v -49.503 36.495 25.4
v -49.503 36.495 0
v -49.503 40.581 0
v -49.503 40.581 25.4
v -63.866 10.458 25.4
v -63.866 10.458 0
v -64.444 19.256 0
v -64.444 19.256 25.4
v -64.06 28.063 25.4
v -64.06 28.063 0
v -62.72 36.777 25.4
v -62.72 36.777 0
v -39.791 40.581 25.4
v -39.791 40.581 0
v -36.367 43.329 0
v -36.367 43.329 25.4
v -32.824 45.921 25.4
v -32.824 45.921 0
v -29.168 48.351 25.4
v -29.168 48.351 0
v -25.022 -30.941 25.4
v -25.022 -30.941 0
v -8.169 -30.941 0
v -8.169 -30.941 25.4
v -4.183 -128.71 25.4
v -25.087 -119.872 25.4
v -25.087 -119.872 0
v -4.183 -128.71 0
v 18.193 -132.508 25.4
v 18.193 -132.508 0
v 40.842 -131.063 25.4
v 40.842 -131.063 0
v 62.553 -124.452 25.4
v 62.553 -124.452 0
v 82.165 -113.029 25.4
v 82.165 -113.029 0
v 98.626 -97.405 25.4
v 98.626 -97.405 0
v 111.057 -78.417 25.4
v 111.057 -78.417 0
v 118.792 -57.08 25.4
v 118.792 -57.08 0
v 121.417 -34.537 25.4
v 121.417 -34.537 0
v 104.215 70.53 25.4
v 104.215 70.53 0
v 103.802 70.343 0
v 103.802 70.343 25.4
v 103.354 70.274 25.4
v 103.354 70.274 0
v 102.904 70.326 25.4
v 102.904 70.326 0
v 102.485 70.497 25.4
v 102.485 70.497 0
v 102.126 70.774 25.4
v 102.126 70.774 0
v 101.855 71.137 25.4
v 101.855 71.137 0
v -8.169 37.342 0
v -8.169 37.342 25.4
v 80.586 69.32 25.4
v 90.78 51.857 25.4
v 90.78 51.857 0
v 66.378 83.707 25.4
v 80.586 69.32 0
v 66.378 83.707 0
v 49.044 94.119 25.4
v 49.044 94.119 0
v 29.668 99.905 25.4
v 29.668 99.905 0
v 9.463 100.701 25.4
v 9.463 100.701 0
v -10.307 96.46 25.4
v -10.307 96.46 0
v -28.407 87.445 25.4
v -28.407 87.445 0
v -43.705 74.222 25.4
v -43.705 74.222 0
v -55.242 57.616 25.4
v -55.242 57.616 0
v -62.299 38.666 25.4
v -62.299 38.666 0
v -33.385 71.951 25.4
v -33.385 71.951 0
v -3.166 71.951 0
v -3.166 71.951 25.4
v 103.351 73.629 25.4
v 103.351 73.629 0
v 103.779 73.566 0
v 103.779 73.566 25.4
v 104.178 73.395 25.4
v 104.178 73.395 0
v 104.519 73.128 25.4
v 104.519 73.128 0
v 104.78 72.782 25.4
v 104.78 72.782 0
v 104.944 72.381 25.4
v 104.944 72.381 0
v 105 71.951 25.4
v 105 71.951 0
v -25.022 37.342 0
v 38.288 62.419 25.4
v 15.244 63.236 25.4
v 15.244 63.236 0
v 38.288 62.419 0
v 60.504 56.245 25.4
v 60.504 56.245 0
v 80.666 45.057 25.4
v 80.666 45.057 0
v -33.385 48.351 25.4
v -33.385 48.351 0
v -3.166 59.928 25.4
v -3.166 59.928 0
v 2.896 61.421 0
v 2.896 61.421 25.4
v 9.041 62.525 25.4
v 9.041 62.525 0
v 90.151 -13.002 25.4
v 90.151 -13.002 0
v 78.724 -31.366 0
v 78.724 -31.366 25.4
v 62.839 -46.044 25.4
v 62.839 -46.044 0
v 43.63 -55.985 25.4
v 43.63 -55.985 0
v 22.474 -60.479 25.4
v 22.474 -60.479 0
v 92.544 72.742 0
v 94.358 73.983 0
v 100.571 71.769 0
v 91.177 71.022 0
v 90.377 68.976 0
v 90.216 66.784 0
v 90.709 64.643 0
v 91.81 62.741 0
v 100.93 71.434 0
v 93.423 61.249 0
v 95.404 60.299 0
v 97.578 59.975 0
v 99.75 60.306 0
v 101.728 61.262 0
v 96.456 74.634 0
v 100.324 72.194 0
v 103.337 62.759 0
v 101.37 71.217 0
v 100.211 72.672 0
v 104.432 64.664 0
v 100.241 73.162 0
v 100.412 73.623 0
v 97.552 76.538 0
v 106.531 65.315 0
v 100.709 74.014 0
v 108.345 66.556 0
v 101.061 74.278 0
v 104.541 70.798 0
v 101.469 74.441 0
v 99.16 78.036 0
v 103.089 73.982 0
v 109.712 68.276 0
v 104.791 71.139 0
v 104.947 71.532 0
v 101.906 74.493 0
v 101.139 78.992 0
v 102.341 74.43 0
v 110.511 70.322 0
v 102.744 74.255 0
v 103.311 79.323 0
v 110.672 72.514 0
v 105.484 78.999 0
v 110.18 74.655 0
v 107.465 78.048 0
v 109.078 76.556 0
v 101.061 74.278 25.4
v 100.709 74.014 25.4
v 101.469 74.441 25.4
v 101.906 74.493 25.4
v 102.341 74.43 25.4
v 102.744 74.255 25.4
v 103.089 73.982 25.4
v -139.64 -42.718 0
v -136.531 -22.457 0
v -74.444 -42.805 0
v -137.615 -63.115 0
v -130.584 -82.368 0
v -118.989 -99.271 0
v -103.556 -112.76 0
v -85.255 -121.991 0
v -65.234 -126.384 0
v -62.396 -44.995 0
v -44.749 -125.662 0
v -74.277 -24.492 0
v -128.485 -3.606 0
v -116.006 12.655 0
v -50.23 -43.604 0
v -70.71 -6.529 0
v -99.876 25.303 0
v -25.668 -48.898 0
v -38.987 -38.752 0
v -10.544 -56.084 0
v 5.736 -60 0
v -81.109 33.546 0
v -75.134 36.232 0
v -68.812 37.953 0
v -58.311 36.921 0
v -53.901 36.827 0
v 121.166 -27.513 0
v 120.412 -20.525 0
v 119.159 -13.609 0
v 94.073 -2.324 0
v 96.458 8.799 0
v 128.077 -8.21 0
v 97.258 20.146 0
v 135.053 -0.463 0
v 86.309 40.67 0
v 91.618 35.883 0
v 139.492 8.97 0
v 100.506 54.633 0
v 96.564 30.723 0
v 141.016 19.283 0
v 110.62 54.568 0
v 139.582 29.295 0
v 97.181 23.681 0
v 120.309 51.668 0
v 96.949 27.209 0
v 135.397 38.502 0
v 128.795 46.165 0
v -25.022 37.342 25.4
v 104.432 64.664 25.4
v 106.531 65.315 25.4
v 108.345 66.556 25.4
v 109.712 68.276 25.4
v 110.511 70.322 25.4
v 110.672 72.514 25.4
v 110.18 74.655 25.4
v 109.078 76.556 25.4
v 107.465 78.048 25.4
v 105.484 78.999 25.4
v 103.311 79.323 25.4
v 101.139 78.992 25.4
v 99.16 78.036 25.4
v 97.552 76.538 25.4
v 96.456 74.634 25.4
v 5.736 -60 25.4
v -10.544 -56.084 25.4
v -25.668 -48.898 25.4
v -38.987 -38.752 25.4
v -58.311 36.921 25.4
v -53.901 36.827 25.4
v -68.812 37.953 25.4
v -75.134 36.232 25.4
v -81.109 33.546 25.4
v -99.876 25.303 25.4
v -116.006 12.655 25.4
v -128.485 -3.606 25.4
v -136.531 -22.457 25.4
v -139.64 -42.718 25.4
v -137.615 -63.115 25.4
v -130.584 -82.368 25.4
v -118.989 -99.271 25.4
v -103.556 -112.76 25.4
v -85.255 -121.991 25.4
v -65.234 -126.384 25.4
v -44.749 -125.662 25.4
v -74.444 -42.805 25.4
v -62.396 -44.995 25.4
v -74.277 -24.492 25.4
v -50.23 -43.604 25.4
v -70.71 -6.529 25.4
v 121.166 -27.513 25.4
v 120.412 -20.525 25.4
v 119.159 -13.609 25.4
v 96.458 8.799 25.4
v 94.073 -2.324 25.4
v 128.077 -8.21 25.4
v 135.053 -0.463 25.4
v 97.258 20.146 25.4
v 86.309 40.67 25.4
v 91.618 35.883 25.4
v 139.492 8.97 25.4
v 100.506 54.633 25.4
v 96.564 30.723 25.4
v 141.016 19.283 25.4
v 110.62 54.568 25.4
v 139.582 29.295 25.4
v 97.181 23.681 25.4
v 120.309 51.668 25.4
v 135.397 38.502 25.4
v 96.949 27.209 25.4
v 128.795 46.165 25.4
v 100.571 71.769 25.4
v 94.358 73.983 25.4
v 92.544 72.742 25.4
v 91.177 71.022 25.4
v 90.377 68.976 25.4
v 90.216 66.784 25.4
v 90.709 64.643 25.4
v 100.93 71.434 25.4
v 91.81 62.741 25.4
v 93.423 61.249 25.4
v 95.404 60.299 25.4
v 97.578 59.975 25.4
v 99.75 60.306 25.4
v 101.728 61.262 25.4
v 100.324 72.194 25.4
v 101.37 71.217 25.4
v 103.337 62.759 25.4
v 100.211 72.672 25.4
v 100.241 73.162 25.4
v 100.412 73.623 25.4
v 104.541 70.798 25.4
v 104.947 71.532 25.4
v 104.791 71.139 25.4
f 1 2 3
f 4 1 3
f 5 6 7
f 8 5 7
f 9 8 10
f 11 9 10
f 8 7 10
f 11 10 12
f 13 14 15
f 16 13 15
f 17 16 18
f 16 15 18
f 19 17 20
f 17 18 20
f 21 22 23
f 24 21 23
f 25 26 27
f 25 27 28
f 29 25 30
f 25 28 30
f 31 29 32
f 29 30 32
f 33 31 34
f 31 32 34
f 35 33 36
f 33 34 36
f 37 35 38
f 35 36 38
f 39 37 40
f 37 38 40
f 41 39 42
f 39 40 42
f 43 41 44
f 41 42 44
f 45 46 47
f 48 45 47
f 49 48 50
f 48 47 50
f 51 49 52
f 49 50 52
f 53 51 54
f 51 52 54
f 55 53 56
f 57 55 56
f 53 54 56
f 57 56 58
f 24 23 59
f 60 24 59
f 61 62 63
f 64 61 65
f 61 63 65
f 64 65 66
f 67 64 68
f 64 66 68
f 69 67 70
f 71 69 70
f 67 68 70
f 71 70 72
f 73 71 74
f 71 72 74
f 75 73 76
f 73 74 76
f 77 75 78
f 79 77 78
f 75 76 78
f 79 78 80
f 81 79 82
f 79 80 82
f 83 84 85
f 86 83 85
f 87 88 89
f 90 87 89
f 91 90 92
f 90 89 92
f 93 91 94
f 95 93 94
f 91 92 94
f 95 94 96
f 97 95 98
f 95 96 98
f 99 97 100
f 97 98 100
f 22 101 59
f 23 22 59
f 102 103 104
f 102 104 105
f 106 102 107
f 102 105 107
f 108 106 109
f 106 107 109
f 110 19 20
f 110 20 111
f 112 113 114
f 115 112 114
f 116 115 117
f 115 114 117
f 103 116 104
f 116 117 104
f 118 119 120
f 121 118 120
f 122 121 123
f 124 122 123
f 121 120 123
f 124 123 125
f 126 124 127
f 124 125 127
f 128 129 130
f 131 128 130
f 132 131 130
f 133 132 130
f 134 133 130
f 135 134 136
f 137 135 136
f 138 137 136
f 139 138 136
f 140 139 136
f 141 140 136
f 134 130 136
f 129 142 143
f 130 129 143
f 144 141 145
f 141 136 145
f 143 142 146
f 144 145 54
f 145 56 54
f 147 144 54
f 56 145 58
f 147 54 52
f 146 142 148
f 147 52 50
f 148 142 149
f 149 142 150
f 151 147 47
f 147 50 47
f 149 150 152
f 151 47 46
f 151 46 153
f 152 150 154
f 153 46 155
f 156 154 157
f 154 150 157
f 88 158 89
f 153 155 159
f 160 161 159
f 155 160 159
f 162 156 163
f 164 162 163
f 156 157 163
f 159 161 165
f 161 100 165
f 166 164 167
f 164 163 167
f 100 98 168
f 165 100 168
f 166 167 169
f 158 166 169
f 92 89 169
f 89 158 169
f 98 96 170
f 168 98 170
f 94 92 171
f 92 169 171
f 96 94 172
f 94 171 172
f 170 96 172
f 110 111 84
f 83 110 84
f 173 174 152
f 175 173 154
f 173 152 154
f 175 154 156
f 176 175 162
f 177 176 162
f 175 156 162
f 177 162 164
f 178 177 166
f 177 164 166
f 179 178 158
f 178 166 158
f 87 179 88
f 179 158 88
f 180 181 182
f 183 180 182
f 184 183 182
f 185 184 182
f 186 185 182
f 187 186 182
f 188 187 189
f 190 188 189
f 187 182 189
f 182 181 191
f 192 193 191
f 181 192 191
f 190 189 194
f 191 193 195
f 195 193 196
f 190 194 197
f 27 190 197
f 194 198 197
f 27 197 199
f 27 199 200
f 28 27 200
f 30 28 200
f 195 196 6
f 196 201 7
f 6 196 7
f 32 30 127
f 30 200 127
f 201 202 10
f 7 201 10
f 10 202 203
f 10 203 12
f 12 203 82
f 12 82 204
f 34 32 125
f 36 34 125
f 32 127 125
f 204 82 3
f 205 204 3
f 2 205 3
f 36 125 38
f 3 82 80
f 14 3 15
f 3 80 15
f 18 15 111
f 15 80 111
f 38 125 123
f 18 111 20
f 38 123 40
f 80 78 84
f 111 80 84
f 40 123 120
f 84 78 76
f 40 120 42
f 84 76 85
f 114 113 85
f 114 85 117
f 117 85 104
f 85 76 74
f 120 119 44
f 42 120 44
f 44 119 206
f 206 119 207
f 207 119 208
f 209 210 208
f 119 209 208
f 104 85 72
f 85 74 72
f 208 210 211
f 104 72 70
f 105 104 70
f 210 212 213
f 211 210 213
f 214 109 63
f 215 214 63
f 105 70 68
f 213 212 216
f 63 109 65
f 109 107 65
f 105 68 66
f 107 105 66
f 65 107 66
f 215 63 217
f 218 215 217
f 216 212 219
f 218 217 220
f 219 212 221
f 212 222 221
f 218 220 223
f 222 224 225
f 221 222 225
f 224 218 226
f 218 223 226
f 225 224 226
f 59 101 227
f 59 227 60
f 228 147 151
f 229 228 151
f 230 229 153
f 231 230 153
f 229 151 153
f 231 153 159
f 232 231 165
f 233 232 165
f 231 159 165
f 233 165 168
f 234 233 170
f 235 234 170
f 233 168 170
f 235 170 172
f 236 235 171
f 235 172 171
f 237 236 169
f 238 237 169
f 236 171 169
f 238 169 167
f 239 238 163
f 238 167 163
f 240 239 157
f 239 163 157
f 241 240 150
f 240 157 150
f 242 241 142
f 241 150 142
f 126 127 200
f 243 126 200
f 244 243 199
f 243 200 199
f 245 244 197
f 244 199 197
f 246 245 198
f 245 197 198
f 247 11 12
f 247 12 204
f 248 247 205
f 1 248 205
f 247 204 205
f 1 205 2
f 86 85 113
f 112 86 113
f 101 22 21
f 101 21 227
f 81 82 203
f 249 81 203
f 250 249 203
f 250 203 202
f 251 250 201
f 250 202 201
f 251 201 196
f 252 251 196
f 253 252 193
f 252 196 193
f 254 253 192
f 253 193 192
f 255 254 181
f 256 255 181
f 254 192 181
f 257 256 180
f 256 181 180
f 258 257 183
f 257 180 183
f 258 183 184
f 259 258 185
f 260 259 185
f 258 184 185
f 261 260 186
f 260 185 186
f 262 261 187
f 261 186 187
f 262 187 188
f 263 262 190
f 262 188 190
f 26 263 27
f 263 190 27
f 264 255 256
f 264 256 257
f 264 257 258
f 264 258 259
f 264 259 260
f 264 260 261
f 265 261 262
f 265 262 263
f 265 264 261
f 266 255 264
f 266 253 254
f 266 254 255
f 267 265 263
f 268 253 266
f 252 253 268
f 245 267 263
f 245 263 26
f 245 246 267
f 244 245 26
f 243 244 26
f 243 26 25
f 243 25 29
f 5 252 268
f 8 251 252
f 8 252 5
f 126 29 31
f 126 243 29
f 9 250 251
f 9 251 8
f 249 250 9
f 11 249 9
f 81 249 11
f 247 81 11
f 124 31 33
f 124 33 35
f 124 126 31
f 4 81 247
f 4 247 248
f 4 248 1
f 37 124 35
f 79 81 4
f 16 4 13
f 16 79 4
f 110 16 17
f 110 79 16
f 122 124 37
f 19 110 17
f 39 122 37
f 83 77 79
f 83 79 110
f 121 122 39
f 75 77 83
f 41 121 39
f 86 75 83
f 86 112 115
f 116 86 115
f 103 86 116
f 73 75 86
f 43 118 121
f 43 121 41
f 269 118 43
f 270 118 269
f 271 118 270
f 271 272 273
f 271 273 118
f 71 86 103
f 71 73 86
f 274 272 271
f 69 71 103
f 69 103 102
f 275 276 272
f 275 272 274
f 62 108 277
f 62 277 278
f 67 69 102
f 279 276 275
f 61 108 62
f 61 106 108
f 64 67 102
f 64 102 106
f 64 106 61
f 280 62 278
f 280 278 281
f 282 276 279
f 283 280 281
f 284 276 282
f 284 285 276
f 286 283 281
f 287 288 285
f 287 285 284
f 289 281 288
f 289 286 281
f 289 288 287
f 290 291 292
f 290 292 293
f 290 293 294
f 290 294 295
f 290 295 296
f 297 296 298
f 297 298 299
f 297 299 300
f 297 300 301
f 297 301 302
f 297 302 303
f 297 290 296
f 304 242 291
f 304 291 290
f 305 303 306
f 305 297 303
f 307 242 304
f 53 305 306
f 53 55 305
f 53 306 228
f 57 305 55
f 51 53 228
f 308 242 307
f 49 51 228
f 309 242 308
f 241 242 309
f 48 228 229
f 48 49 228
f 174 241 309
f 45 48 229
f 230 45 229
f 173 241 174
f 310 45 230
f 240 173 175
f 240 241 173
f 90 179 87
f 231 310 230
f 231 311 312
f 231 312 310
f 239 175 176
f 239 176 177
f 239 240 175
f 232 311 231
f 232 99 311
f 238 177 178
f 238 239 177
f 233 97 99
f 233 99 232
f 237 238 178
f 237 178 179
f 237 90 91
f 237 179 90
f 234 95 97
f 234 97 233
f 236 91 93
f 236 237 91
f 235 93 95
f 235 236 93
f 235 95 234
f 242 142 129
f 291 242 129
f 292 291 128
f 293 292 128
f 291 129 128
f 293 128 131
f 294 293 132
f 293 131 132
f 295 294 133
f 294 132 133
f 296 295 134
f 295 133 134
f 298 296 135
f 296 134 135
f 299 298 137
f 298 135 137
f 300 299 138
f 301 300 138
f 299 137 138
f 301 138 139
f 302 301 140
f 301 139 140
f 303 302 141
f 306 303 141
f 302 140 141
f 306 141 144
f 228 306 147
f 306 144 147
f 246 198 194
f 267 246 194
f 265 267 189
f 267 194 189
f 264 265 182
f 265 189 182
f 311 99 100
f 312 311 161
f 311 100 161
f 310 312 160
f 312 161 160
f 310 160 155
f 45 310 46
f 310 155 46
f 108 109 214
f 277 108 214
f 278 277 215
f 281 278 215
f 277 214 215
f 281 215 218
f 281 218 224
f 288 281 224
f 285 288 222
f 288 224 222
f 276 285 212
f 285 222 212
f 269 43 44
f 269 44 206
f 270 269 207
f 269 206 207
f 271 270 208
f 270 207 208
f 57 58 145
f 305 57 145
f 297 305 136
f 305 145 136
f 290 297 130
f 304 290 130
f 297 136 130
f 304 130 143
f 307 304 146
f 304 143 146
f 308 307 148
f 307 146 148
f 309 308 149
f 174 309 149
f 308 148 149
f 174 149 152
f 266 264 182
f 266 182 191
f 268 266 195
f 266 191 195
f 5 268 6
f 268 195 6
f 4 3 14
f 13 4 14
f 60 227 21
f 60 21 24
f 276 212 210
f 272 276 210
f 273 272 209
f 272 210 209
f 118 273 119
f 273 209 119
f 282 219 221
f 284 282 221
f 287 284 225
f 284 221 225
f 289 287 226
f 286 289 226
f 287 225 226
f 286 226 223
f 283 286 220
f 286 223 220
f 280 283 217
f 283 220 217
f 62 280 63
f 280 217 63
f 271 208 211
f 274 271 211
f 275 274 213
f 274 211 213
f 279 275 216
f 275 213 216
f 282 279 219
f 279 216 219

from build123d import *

# Parameters (mm, degrees)
F2_DEPTH = 25.4
F1_W     = 16.8528687209
F1_H     = 68.2831704617


with BuildPart() as f2:
    # F0 (on Top) → F2 (new body)
    with BuildSketch(Plane.XY):
        with BuildLine():
            Line((-49.5025888085, 37.0713974876), (-49.5025888085, 40.580611676))
            Line((-49.5025888085, 40.580611676), (-39.7907553246, 40.580611676))
            ThreePointArc((-39.7907553246, 40.580611676), (-34.6098015178, 44.6443329786), (-29.1679251123, 48.3513660729))
            Line((-29.1679251123, 48.3513660729), (-33.3854667842, 48.3513660729))
            Line((-33.3854667842, 48.3513660729), (-33.3854667842, 71.9514340162))
            Line((-33.3854667842, 71.9514340162), (-3.1658636872, 71.9514340162))
            Line((-3.1658636872, 71.9514340162), (-3.1658636872, 59.9276361178))
            ThreePointArc((-3.1658636872, 59.9276361178), (5.9600436723, 62.0215858009), (15.2440057959, 63.2360229941))
            ThreePointArc((15.2440057959, 63.2360229941), (49.5778198862, 59.9869622775), (80.6658483191, 45.0570703257))
            ThreePointArc((80.6658483191, 45.0570703257), (85.430622589, 48.8921812548), (90.7804225826, 51.8571078492))
            ThreePointArc((90.7804225826, 51.8571078492), (9.4634630221, 100.7013779193), (-62.2989550674, 38.6661783889))
            ThreePointArc((-62.2989550674, 38.6661783889), (-55.8389801005, 38.3645996091), (-49.5025888085, 37.0713974876))
        make_face()
        with BuildLine():
            Line((-49.5025888085, 36.4953762559), (-49.5025888085, 37.0713974876))
            ThreePointArc((-49.5025888085, 37.0713974876), (-55.8389801005, 38.3645996091), (-62.2989550674, 38.6661783889))
            ThreePointArc((-62.2989550674, 38.6661783889), (-62.5149697878, 37.7228914144), (-62.7196793883, 36.7770866486))
            ThreePointArc((-62.7196793883, 36.7770866486), (-56.1054350959, 36.9036132539), (-49.5025888085, 36.4953762559))
        make_face()
        with BuildLine():
            ThreePointArc((-62.7196793883, 36.7770866486), (-62.5149697878, 37.7228914144), (-62.2989550674, 38.6661783889))
            ThreePointArc((-62.2989550674, 38.6661783889), (-72.0064664227, 37.2167133178), (-81.1094346236, 33.5461962372))
            ThreePointArc((-81.1094346236, 33.5461962372), (-72.0070206612, 35.6879310326), (-62.7196793883, 36.7770866486))
        make_face()
        with BuildLine():
            ThreePointArc((-63.8659995996, 10.4583134456), (-64.3719474611, 23.6647008425), (-62.7196793883, 36.7770866486))
            ThreePointArc((-62.7196793883, 36.7770866486), (-72.0070206612, 35.6879310326), (-81.1094346236, 33.5461962372))
            ThreePointArc((-81.1094346236, 33.5461962372), (-102.7079827023, -6.8058090209), (-74.4437638245, -42.8046359281))
            ThreePointArc((-74.4437638245, -42.8046359281), (-72.9135561951, -15.4267066617), (-63.8659995996, 10.4583134456))
        make_face()
        with BuildLine():
            ThreePointArc((141.0155446812, 19.2829854786), (124.7483672687, 49.218920993), (90.7804225826, 51.8571078492))
            ThreePointArc((90.7804225826, 51.8571078492), (94.3912384761, 41.4869150844), (96.5636117978, 30.723101469))
            ThreePointArc((96.5636117978, 30.723101469), (110.7188146873, 10.0132285595), (119.159266122, -13.6093746914))
            ThreePointArc((119.159266122, -13.6093746914), (135.053300791, -0.4629271998), (141.0155446812, 19.2829854786))
        make_face()
        with BuildLine():
            ThreePointArc((96.5636117978, 30.723101469), (94.3912384761, 41.4869150844), (90.7804225826, 51.8571078492))
            ThreePointArc((90.7804225826, 51.8571078492), (85.430622589, 48.8921812548), (80.6658483191, 45.0570703257))
            ThreePointArc((80.6658483191, 45.0570703257), (89.0068432279, 38.3249774817), (96.5636117978, 30.723101469))
        make_face()
        with BuildLine():
            ThreePointArc((-74.4437638245, -42.8046359281), (-102.7079827023, -6.8058090209), (-81.1094346236, 33.5461962372))
            ThreePointArc((-81.1094346236, 33.5461962372), (-134.7050259775, -72.9626037486), (-25.0869596842, -119.8719997061))
            ThreePointArc((-25.0869596842, -119.8719997061), (-59.3024078551, -87.4461966052), (-74.4437638245, -42.8046359281))
        make_face()
        with BuildLine():
            ThreePointArc((119.159266122, -13.6093746914), (110.7188146873, 10.0132285595), (96.5636117978, 30.723101469))
            ThreePointArc((96.5636117978, 30.723101469), (97.0844987994, 25.446170827), (97.2583770877, 20.1464456823))
            ThreePointArc((97.2583770877, 20.1464456823), (95.4614877023, 3.1953214101), (90.1506877844, -13.0023583553))
            ThreePointArc((90.1506877844, -13.0023583553), (104.5904854335, -16.3878384409), (119.159266122, -13.6093746914))
        make_face()
        with BuildLine():
            ThreePointArc((-38.9872045552, -38.7517134075), (-56.2618387916, -44.7468429236), (-74.4437638245, -42.8046359281))
            ThreePointArc((-74.4437638245, -42.8046359281), (-59.3024078551, -87.4461966052), (-25.0869596842, -119.8719997061))
            ThreePointArc((-25.0869596842, -119.8719997061), (6.0174306384, -96.0404292132), (22.473639917, -60.4789328206))
            ThreePointArc((22.473639917, -60.4789328206), (-10.5435041052, -56.0838844784), (-38.9872045552, -38.7517134075))
        make_face()
        with BuildLine():
            ThreePointArc((22.473639917, -60.4789328206), (6.0174306384, -96.0404292132), (-25.0869596842, -119.8719997061))
            ThreePointArc((-25.0869596842, -119.8719997061), (72.6903570249, -119.3093511098), (121.4173114057, -34.5366895199))
            ThreePointArc((121.4173114057, -34.5366895199), (120.8511665295, -24.0122979171), (119.159266122, -13.6093746914))
            ThreePointArc((119.159266122, -13.6093746914), (104.5904854335, -16.3878384409), (90.1506877844, -13.0023583553))
            ThreePointArc((90.1506877844, -13.0023583553), (62.8386839696, -46.0440888012), (22.473639917, -60.4789328206))
        make_face()
    extrude(amount=F2_DEPTH)


with BuildPart() as f2b:
    # F0 (on Top) → F2, piece 2 (new body)
    with BuildSketch(Plane.XY):
        with BuildLine():
            ThreePointArc((104.4322752931, 64.6640678834), (108.9133387627, 67.1475038668), (110.6936868247, 71.9514340162))
            ThreePointArc((110.6936868247, 71.9514340162), (104.6870574646, 79.1954088108), (96.4562194542, 74.6338221634))
            ThreePointArc((96.4562194542, 74.6338221634), (98.6289635531, 74.6408657983), (100.7093771868, 74.0141715792))
            ThreePointArc((100.7093771868, 74.0141715792), (102.1251836507, 74.4755119971), (103.350502148, 73.6293810946))
            ThreePointArc((103.350502148, 73.6293810946), (104.5188640577, 73.1280649468), (105.0004521442, 71.9514340162))
            ThreePointArc((105.0004521442, 71.9514340162), (104.7909240798, 71.1394293752), (104.2146607213, 70.5301887919))
            ThreePointArc((104.2146607213, 70.5301887919), (104.7546280593, 68.9788517196), (104.9376465073, 67.3464560306))
            ThreePointArc((104.9376465073, 67.3464560306), (104.8102020096, 65.9816660984), (104.4322752931, 64.6640678834))
        make_face()
        with BuildLine():
            ThreePointArc((100.7093771868, 74.0141715792), (98.6289635531, 74.6408657983), (96.4562194542, 74.6338221634))
            ThreePointArc((96.4562194542, 74.6338221634), (97.566227215, 67.3464560306), (104.4322752931, 64.6640678834))
            ThreePointArc((104.4322752931, 64.6640678834), (104.8102020096, 65.9816660984), (104.9376465073, 67.3464560306))
            ThreePointArc((104.9376465073, 67.3464560306), (104.7546280593, 68.9788517196), (104.2146607213, 70.5301887919))
            ThreePointArc((104.2146607213, 70.5301887919), (102.9043597161, 70.3261166169), (101.8550054284, 71.1369123715))
            ThreePointArc((101.8550054284, 71.1369123715), (100.3241009481, 72.1940624858), (100.7093771868, 74.0141715792))
        make_face()
        with BuildLine():
            ThreePointArc((104.4322752931, 64.6640678834), (97.566227215, 67.3464560306), (96.4562194542, 74.6338221634))
            ThreePointArc((96.4562194542, 74.6338221634), (91.8101868977, 62.7414780449), (104.4322752931, 64.6640678834))
        make_face()
    extrude(amount=F2_DEPTH)


with BuildPart() as f2c:
    # F1 (on Top) → F2, piece 3 (new body)
    with BuildSketch(Plane.XY):
        with Locations((-16.5952229872, 3.2008066773)):
            Rectangle(F1_W, F1_H)
    extrude(amount=F2_DEPTH)


solid = Compound([f2.part, f2b.part, f2c.part])
